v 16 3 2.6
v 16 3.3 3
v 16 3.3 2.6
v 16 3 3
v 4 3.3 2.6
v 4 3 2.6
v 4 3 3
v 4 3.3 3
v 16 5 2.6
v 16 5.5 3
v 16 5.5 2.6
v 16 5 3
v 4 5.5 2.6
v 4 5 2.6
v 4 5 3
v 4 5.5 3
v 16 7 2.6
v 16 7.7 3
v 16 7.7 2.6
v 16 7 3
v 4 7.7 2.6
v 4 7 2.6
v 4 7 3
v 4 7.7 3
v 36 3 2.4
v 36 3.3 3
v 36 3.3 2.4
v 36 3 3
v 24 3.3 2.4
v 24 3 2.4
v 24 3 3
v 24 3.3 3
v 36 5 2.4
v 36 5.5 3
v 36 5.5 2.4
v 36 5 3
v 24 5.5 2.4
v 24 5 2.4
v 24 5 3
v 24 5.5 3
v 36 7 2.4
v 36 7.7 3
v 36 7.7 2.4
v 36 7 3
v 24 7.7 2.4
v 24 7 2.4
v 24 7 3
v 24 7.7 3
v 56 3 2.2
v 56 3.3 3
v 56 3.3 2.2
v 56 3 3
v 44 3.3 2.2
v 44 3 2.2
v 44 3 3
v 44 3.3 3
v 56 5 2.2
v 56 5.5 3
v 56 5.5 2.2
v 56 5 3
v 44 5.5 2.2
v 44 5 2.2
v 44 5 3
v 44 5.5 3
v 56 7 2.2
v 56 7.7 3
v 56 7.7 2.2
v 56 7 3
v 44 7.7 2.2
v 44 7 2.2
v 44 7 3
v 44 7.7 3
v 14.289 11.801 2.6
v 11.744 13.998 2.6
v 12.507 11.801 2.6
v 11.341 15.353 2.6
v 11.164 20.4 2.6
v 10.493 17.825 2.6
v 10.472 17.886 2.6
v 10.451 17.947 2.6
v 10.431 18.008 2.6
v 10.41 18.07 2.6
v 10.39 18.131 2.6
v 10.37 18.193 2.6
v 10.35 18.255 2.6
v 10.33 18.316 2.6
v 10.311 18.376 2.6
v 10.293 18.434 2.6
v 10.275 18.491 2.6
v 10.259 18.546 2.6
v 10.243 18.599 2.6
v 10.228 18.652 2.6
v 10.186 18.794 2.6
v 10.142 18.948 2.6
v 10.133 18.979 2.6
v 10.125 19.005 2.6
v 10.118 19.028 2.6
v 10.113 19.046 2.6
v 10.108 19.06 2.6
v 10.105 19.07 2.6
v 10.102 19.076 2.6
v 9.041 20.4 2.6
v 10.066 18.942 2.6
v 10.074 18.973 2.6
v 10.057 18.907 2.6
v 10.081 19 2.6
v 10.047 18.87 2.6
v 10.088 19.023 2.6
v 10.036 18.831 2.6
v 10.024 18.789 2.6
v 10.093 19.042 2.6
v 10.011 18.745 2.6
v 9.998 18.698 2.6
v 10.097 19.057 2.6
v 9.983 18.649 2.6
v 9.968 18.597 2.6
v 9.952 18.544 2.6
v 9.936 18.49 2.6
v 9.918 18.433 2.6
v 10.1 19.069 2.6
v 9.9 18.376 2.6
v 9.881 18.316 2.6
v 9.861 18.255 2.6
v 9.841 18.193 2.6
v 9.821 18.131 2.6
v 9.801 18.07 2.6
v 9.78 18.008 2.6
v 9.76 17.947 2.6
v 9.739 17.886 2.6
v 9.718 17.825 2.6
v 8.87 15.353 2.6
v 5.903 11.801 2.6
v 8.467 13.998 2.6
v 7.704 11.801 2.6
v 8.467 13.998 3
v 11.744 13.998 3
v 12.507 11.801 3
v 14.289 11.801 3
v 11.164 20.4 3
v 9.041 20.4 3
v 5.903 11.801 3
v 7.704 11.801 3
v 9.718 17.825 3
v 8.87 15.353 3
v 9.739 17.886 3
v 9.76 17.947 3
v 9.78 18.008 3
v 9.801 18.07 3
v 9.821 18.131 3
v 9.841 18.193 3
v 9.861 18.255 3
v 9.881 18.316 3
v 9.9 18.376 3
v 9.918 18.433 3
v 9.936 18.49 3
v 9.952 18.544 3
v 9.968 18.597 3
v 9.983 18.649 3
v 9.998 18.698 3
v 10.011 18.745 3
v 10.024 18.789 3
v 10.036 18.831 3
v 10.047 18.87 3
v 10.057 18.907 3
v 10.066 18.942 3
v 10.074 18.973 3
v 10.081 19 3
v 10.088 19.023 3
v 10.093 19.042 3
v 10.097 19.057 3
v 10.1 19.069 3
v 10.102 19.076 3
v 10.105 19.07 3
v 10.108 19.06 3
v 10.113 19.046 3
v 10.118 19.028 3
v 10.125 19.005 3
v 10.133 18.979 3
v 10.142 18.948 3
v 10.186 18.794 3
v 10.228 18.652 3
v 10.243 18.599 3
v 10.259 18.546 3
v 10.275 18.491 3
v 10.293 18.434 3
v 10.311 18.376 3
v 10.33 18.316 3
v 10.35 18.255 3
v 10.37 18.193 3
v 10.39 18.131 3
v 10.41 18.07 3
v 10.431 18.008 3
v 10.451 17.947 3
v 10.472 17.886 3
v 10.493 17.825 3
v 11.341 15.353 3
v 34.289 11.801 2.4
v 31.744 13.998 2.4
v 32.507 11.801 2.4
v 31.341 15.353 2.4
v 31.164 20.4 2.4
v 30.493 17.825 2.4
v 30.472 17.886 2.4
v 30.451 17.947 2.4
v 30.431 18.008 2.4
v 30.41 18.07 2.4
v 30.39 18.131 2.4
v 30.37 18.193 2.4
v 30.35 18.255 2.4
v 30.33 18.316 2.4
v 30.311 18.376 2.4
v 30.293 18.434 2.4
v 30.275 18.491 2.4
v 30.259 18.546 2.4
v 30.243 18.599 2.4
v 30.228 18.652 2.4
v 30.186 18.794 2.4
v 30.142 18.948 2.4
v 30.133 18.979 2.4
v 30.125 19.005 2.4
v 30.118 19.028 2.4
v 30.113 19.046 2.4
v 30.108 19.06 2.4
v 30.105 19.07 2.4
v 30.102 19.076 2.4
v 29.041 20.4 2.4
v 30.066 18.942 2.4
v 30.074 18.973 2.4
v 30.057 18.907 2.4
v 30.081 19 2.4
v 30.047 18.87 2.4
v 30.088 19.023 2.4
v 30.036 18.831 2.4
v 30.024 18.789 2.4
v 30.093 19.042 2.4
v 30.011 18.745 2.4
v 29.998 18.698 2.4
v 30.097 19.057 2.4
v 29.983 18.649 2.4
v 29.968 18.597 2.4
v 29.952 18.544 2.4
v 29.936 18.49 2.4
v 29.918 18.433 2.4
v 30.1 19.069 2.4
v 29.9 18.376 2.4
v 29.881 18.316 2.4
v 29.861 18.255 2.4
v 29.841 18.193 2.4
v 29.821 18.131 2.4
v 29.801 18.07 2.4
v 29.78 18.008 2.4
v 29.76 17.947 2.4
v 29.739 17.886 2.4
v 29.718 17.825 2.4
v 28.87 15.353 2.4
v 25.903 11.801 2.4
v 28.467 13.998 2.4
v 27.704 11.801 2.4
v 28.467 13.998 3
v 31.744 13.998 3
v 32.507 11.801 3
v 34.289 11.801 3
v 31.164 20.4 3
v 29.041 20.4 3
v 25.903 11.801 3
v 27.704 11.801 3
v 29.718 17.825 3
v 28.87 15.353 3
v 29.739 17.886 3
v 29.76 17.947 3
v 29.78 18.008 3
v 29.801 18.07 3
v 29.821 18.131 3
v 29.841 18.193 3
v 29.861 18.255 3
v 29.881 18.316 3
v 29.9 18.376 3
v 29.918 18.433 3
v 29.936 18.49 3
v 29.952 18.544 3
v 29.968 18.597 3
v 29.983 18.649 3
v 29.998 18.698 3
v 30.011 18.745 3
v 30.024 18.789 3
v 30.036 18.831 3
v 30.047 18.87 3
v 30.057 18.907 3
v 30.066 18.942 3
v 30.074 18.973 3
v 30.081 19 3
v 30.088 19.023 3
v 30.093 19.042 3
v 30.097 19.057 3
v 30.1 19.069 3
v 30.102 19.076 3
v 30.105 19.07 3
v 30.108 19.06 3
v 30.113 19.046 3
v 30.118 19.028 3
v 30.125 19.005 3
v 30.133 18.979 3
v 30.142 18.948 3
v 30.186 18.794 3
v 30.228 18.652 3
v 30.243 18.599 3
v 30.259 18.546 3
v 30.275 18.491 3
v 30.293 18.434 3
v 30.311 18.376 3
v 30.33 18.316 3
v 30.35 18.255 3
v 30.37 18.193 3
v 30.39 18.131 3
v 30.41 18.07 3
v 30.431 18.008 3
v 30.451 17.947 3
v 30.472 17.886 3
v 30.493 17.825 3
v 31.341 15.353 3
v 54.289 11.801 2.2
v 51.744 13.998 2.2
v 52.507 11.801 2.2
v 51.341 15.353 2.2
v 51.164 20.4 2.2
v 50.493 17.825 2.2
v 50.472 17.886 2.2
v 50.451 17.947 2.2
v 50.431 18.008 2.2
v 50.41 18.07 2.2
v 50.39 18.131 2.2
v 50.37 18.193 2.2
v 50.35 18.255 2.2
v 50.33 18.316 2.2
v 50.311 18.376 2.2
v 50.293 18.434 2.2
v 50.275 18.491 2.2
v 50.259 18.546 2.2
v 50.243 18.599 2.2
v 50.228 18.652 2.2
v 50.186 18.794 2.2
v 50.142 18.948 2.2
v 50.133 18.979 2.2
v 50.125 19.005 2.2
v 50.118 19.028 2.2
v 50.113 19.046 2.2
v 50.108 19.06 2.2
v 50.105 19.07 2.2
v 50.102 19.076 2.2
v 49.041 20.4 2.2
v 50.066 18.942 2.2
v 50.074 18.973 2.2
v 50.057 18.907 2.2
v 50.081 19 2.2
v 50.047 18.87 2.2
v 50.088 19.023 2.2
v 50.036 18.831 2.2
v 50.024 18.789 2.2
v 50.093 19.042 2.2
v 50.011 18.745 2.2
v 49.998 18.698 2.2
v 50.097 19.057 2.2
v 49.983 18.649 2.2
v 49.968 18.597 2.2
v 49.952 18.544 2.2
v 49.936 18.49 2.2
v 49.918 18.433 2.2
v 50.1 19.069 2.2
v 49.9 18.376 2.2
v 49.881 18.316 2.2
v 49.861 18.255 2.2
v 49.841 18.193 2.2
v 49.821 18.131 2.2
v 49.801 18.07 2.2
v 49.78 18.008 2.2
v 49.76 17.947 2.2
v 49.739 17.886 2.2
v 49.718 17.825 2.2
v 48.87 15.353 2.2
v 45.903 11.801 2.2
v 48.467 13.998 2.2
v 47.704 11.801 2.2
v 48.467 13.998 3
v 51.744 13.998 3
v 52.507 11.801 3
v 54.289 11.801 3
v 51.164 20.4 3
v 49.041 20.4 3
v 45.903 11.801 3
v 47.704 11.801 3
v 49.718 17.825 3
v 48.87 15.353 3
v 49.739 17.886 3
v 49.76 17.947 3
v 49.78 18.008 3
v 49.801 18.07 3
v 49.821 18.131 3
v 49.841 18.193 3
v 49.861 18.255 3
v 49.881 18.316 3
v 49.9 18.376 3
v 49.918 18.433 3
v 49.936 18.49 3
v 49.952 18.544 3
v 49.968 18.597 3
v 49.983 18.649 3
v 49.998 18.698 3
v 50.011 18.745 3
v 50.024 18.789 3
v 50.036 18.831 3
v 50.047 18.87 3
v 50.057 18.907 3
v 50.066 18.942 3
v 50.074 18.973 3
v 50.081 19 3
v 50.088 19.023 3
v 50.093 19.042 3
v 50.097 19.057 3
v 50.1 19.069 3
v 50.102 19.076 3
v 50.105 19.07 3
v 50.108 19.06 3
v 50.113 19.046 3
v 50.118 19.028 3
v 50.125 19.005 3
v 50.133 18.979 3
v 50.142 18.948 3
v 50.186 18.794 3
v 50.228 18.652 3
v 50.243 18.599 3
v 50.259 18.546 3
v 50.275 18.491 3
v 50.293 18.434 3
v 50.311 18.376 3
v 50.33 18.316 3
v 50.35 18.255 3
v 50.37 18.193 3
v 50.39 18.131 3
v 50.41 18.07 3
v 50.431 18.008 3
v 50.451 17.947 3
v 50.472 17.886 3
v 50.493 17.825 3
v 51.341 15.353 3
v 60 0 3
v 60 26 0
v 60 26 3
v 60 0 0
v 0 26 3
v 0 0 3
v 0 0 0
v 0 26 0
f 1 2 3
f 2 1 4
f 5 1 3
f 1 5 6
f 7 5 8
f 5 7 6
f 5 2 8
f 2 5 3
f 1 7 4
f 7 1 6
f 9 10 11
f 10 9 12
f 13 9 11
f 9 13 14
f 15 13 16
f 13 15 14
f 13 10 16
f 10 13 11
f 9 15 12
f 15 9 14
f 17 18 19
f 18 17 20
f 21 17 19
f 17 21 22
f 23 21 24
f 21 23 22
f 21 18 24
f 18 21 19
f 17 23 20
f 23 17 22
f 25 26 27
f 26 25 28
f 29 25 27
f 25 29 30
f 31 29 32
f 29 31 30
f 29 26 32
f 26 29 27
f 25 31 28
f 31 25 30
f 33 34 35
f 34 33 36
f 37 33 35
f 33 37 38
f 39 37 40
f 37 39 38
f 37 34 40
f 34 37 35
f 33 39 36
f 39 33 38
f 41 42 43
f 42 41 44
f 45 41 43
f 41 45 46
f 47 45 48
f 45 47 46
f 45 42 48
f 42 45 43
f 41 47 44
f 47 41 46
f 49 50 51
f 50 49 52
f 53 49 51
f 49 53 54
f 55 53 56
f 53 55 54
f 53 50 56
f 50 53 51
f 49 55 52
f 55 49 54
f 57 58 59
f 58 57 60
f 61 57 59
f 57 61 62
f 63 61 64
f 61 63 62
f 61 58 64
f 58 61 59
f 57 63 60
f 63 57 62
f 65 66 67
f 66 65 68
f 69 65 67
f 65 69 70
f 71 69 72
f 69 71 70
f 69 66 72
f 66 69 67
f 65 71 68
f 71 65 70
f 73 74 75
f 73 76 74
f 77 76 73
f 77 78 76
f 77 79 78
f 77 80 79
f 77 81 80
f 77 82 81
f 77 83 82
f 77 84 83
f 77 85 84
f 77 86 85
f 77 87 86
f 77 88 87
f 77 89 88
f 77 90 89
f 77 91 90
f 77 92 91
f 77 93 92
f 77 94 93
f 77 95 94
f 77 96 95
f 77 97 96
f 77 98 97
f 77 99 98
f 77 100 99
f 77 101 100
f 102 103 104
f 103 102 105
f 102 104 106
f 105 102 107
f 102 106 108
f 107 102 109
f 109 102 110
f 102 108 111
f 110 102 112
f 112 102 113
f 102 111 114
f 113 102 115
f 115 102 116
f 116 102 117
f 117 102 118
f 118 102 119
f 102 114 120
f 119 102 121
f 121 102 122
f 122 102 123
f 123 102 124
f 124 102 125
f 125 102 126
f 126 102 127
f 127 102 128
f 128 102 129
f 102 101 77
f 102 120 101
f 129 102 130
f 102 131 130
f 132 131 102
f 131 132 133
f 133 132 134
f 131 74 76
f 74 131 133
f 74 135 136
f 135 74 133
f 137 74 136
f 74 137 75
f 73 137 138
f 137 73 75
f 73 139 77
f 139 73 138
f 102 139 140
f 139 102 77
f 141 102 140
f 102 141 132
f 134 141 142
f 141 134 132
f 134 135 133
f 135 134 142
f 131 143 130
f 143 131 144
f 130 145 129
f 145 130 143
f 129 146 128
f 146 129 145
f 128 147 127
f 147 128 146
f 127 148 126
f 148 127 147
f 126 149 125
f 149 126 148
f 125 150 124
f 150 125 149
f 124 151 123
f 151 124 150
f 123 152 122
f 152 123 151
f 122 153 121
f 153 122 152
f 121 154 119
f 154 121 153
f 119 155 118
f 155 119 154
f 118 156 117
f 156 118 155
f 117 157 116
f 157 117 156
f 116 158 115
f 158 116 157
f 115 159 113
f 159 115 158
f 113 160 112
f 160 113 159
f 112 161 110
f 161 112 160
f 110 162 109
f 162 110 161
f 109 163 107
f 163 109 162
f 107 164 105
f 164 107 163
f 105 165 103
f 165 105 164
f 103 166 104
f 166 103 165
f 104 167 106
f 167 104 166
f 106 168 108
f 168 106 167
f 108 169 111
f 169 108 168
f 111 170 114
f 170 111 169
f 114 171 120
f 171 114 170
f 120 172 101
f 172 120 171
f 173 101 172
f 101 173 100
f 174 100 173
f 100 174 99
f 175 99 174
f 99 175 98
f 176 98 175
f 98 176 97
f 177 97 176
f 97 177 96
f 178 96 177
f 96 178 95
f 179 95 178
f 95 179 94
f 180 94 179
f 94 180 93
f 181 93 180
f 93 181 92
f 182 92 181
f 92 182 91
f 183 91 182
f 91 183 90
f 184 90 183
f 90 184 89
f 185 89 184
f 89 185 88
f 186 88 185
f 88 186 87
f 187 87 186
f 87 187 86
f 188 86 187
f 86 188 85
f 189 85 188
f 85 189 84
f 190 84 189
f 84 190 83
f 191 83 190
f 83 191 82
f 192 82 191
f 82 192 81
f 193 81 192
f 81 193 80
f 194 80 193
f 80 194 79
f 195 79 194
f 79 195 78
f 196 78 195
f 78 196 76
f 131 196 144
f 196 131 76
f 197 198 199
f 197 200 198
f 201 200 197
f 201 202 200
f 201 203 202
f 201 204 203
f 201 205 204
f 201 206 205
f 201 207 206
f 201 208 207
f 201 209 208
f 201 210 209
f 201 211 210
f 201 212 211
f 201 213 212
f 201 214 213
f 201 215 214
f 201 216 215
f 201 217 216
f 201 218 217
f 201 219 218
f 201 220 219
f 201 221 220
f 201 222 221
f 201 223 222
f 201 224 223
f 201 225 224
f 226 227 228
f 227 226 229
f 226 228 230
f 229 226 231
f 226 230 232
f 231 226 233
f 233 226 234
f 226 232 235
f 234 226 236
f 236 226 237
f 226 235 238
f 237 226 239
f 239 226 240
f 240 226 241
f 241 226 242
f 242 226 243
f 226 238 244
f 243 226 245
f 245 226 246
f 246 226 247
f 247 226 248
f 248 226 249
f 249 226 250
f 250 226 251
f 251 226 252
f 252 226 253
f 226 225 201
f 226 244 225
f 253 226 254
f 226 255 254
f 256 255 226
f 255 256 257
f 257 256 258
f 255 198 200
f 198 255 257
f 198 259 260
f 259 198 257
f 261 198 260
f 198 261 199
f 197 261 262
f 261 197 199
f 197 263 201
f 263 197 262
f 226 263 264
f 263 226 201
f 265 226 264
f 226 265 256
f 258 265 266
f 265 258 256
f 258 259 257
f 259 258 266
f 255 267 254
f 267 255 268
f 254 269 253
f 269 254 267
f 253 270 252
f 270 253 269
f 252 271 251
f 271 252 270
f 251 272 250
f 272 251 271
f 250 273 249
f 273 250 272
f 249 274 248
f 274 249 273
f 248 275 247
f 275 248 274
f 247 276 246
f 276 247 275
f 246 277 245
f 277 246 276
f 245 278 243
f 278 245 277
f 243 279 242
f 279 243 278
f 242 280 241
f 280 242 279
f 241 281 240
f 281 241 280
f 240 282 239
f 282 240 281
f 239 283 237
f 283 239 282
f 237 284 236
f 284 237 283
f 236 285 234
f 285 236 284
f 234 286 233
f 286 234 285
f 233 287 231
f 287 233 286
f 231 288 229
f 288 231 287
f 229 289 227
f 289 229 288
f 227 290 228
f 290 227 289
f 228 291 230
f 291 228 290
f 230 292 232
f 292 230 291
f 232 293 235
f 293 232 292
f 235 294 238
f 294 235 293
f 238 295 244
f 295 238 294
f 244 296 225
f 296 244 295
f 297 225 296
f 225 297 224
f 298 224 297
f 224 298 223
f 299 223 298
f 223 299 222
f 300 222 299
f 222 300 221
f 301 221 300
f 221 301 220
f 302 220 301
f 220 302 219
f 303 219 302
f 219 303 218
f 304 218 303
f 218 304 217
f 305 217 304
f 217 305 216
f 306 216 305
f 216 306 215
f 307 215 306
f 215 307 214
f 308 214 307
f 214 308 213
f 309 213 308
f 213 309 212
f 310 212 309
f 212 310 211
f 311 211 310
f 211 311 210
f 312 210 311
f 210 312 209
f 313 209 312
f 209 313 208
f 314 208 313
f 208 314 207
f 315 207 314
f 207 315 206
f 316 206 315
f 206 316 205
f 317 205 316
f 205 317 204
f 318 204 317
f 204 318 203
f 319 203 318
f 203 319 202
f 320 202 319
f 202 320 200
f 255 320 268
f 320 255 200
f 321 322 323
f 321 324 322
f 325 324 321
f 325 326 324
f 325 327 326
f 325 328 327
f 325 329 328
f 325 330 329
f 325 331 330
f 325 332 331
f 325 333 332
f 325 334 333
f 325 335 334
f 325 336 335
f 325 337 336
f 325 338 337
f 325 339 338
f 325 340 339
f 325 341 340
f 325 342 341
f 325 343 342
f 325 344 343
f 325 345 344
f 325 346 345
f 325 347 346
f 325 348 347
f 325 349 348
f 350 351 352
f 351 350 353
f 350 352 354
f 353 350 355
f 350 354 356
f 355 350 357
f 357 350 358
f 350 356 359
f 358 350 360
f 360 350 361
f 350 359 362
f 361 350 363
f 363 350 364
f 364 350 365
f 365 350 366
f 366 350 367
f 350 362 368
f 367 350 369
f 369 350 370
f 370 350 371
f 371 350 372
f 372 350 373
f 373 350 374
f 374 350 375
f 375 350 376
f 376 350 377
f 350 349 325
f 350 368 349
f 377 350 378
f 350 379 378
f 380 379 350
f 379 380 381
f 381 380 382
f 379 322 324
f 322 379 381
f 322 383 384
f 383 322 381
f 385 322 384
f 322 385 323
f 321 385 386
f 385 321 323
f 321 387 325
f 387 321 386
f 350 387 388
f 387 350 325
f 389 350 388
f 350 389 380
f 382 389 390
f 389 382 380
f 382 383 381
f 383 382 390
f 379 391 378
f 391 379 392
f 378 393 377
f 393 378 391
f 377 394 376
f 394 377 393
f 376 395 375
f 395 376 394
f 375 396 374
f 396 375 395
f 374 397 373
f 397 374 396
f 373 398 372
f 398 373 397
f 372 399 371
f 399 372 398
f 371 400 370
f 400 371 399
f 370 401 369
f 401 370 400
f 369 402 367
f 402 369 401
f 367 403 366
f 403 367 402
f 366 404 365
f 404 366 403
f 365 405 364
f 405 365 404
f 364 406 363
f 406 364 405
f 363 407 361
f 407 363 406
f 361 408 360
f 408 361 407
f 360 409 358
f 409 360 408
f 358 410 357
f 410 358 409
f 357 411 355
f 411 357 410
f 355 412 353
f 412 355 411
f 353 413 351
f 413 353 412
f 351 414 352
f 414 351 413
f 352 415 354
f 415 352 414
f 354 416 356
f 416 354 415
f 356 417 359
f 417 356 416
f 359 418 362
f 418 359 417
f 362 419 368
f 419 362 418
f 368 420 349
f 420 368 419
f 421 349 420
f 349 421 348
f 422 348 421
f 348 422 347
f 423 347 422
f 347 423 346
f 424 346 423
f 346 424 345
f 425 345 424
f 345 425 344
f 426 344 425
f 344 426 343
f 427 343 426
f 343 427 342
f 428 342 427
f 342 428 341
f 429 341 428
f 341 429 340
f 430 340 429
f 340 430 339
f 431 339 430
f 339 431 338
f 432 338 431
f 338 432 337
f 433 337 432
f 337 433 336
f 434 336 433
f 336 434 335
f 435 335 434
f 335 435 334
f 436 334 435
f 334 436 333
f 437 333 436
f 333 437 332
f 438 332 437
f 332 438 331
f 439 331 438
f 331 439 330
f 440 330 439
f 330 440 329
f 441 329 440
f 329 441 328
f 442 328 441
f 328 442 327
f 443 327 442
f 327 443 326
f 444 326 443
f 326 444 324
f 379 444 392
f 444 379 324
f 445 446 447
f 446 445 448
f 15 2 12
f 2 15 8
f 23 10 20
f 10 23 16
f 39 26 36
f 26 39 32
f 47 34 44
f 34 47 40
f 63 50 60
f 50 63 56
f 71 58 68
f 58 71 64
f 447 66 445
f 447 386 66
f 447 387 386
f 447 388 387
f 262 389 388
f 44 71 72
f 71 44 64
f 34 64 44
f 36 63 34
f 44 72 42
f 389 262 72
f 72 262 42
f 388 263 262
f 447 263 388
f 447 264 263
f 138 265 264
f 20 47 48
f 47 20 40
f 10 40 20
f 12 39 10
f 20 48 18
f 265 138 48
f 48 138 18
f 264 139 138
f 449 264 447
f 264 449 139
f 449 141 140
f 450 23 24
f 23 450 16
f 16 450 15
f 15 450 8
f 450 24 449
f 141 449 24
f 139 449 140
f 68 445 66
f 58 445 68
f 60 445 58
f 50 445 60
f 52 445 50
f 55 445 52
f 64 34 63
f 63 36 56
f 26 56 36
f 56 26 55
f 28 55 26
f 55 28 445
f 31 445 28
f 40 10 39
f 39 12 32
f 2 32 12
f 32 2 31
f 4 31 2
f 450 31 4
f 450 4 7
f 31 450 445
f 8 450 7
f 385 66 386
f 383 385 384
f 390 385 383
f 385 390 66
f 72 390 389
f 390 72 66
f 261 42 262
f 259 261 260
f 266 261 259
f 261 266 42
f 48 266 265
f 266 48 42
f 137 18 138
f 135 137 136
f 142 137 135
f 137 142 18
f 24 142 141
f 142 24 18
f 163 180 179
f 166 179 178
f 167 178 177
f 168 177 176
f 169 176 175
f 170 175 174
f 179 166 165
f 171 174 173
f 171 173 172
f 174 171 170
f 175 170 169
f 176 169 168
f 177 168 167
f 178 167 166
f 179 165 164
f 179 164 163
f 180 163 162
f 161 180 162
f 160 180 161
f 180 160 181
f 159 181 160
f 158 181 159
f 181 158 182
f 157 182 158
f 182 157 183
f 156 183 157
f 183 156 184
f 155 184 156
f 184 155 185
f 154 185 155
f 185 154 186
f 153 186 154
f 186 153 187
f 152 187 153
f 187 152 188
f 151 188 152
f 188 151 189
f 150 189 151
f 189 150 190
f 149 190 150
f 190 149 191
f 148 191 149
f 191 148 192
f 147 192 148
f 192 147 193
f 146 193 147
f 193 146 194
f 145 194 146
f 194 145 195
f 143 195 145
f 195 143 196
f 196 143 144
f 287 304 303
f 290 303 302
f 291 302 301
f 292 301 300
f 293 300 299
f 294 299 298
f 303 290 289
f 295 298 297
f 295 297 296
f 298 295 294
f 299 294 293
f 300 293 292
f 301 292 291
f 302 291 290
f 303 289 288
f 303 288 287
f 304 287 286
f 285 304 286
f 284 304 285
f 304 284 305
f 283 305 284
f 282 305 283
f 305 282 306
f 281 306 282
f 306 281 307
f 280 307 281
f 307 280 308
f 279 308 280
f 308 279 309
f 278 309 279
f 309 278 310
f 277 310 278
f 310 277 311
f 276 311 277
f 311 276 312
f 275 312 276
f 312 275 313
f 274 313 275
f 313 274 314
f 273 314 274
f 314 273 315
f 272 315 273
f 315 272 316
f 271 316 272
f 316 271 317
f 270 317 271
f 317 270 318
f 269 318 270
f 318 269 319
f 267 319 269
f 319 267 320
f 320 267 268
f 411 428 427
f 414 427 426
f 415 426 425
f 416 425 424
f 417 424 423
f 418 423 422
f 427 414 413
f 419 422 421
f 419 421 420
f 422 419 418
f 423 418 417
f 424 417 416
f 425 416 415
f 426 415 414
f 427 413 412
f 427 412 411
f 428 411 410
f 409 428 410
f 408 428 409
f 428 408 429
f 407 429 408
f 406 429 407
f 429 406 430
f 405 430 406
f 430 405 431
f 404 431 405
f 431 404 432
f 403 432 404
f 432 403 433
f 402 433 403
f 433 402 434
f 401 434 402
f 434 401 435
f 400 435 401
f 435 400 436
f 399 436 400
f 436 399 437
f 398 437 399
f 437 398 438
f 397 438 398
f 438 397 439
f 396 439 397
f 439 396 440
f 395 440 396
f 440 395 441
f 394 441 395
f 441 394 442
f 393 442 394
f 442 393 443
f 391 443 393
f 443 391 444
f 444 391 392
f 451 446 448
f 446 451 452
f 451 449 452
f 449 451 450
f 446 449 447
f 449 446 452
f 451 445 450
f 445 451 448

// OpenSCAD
// Paint-fill coupon. Units mm. Print face upward, no supports.
// Depths left to right: 0.4, 0.6, 0.8 mm. Each column also tests fine grooves.
// ASCII works without a Japanese font; replace with your densest actual kanji.
sample_text = "A";
font_name = "Liberation Sans:style=Bold";
depths = [0.4, 0.6, 0.8];
groove_widths = [0.3, 0.5, 0.7];
$fn = 48;
difference() {
    cube([60, 26, 3]);
    for (i=[0:2]) {
        translate([10+20*i, 16, 3-depths[i]])
            linear_extrude(height=depths[i]+0.02)
                text(sample_text, size=9, font=font_name,
                     halign="center", valign="center");
        for (j=[0:2])
            translate([4+20*i, 3+j*2, 3-depths[i]])
                cube([12, groove_widths[j], depths[i]+0.02]);
    }
}
